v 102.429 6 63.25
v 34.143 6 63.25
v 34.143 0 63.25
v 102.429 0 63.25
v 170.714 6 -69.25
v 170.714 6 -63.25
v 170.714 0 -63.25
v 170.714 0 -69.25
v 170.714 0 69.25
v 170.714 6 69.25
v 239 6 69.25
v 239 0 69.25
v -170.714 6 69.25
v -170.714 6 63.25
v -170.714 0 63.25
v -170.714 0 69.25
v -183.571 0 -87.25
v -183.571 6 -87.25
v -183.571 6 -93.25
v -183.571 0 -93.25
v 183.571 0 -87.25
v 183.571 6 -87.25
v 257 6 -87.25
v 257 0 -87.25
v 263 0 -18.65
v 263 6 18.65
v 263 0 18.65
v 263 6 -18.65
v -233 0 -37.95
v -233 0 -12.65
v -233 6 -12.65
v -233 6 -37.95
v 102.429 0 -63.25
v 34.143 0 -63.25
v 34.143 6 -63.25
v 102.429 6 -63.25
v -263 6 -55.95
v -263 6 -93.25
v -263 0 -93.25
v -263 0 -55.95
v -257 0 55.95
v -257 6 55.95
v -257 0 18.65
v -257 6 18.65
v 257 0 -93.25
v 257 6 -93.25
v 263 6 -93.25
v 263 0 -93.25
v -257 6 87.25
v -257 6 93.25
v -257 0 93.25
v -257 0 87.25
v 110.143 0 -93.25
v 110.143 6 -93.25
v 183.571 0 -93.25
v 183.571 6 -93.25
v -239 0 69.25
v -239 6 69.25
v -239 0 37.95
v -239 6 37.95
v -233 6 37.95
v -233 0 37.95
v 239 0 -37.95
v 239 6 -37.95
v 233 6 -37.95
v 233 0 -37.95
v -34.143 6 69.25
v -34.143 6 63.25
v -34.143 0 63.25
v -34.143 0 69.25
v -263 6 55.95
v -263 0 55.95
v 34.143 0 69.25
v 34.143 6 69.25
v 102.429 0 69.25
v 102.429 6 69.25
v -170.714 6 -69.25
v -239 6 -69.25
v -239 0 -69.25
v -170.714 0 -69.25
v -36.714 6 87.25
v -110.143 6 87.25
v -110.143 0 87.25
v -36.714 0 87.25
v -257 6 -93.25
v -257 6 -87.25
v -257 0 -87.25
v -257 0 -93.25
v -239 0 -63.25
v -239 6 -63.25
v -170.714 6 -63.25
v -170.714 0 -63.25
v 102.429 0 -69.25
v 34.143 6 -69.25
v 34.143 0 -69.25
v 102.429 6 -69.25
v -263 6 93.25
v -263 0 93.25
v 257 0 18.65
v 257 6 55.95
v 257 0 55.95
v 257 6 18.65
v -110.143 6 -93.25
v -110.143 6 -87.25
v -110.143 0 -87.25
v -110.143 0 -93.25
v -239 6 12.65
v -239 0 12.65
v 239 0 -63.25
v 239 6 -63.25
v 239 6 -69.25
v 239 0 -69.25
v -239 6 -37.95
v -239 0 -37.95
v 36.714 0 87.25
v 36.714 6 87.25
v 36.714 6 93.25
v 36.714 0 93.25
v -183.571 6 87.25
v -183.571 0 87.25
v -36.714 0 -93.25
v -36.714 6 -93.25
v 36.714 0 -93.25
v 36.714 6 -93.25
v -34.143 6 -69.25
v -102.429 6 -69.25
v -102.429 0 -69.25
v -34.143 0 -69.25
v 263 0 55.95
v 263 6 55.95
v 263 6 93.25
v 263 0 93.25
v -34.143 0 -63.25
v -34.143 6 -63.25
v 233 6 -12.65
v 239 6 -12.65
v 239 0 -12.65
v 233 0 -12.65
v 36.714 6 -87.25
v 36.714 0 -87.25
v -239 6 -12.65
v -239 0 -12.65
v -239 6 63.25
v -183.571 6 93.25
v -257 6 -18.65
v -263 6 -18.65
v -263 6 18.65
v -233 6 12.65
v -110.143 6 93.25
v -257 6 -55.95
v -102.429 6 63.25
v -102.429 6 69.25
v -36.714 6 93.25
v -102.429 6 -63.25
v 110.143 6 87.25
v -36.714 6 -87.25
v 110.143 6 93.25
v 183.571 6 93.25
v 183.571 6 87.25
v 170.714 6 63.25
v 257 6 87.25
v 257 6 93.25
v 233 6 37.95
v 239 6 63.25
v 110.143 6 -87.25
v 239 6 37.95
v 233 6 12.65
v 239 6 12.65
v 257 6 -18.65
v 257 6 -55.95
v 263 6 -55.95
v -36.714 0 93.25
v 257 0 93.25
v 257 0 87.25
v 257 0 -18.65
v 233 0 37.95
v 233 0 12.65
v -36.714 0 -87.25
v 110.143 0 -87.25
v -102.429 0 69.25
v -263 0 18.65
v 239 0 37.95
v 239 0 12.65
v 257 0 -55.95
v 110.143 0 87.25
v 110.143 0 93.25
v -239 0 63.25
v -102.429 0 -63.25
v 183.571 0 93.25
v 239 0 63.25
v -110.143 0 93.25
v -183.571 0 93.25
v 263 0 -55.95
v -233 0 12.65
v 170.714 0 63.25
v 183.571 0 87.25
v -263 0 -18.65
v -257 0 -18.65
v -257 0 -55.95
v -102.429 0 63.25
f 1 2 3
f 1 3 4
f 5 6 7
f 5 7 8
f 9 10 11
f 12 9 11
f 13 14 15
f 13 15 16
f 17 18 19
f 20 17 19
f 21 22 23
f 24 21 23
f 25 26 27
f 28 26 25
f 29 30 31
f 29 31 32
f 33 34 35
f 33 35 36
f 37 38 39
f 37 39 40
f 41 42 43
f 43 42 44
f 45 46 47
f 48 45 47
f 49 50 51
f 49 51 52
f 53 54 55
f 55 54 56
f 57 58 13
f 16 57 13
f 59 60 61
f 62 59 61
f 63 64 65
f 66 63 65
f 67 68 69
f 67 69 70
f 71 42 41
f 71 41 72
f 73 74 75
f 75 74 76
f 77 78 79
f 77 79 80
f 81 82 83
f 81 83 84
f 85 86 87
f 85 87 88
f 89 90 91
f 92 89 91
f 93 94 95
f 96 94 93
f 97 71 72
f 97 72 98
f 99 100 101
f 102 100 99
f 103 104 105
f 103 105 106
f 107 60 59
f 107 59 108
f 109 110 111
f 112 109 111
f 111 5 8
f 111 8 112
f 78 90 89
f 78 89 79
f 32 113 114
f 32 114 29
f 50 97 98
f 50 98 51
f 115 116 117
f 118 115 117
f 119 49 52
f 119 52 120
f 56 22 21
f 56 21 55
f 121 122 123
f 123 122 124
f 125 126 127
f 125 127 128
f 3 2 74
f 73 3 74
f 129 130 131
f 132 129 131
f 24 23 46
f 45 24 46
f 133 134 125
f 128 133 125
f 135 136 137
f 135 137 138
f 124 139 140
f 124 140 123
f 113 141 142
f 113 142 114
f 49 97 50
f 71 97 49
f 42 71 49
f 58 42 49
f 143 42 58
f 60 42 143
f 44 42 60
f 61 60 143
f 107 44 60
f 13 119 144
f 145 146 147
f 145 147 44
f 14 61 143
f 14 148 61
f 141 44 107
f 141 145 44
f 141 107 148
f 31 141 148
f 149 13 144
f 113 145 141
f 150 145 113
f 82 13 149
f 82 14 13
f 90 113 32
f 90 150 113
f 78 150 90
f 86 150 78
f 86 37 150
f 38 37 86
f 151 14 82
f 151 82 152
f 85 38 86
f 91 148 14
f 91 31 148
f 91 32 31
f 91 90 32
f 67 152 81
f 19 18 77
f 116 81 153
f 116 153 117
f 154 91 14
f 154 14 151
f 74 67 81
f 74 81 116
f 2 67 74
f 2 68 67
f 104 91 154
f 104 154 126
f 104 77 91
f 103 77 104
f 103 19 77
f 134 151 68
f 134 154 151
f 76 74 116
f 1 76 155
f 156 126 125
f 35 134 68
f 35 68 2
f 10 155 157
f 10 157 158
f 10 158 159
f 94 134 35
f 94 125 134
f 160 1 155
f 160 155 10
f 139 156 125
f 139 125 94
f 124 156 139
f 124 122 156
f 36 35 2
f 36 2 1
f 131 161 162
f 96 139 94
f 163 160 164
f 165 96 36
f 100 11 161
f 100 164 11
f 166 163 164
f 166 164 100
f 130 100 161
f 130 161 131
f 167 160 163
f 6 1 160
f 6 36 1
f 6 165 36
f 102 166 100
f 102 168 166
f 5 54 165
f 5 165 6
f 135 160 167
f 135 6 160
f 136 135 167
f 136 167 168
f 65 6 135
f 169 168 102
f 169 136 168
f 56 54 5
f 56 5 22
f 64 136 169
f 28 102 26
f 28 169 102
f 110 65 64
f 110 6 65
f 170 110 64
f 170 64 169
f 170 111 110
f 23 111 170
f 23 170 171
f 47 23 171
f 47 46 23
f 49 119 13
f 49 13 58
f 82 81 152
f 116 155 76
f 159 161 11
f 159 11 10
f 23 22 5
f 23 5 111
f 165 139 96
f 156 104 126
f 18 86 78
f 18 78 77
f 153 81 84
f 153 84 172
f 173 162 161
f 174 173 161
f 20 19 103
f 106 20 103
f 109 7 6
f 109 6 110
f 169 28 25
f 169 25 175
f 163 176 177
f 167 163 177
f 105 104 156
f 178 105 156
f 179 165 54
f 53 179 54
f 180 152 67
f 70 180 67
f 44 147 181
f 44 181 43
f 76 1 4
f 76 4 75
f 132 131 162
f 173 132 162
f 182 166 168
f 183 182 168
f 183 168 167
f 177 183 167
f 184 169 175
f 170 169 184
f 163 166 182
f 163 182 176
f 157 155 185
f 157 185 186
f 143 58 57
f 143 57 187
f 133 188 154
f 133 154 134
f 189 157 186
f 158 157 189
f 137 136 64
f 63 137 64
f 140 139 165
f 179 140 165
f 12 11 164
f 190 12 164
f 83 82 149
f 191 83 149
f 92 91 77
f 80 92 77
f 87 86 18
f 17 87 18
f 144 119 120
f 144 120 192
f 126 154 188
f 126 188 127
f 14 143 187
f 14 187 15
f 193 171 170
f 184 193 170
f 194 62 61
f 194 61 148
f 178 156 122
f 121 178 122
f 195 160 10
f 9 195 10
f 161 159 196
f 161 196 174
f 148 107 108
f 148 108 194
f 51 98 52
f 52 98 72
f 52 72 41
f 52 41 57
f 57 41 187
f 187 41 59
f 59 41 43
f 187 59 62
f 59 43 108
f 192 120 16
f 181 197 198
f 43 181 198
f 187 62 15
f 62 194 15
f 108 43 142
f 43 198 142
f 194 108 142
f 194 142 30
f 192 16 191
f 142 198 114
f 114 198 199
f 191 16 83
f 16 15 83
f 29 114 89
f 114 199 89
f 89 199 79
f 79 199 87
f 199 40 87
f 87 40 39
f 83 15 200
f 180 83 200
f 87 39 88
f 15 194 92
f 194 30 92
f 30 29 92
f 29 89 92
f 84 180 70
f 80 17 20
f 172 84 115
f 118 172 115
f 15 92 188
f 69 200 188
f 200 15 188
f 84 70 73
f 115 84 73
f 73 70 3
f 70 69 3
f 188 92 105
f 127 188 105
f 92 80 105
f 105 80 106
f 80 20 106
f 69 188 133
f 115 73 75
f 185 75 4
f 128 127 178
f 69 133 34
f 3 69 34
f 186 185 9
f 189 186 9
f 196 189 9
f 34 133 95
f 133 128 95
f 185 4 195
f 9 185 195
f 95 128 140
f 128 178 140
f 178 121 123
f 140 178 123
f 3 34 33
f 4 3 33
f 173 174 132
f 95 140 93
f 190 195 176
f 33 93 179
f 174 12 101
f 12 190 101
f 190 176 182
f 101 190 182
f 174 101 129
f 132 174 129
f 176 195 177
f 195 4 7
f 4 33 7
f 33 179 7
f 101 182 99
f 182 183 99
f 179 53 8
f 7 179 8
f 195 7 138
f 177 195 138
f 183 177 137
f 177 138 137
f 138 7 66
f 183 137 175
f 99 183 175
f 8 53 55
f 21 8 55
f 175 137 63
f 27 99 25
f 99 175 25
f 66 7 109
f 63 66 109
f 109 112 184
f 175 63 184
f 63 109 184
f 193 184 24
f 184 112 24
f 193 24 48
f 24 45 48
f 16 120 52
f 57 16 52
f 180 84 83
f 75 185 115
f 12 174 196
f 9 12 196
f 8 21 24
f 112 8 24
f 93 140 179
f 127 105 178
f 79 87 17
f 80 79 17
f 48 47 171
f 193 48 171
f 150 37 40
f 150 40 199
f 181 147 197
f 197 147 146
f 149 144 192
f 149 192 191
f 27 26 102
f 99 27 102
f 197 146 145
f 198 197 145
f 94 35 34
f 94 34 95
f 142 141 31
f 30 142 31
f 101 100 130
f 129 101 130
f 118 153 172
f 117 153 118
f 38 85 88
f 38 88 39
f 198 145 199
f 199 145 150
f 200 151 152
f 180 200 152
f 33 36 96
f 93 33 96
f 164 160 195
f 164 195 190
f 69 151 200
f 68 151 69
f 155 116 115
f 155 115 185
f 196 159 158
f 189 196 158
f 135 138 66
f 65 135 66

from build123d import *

# Parameters (mm, degrees)
SKETCH1_W           = 466
SKETCH1_H           = 126.5
BOSS_EXTRUDE1_DEPTH = 6
SKETCH2_W           = 514
SKETCH2_H           = 174.5
SKETCH2_W_2         = 68.285714286
SKETCH2_H_2         = 6
SKETCH2_W_3         = 68.285714285
SKETCH2_W_4         = 73.428571428
SKETCH2_W_5         = 6
SKETCH2_H_3         = 25.3
SKETCH2_H_4         = 37.3
BOSS_EXTRUDE2_DEPTH = 6


with BuildPart() as part:
    # Sketch1 → Boss-Extrude1 (new body)
    with BuildSketch(Plane(origin=(0, 0, 0), x_dir=(1, 0, 0), z_dir=(0, 1, 0))):
        Rectangle(SKETCH1_W, SKETCH1_H)
    extrude(amount=BOSS_EXTRUDE1_DEPTH)

    # Sketch2 → Boss-Extrude2 (add)
    with BuildSketch(Plane(origin=(0, 6, 0), x_dir=(1, 0, 0), z_dir=(0, 1, 0))):
        Rectangle(SKETCH2_W, SKETCH2_H)
        Polygon((170.714285714, 69.25), (102.428571429, 69.25), (34.142857143, 69.25), (-34.142857143, 69.25), (-102.428571429, 69.25), (-170.714285714, 69.25), (-239, 69.25), (-239, 63.25), (-239, 37.95), (-239, 12.65), (-239, -12.65), (-239, -37.95), (-239, -63.25), (-239, -69.25), (239, -69.25), (239, 69.25), align=None, mode=Mode.SUBTRACT)
        with Locations((0, 66.25)):
            Rectangle(SKETCH2_W_2, SKETCH2_H_2)
        with Locations((-136.571428572, 66.25)):
            Rectangle(SKETCH2_W_3, SKETCH2_H_2)
        with Locations((136.571428572, 66.25)):
            Rectangle(SKETCH2_W_3, SKETCH2_H_2)
        with Locations((-146.857142857, 90.25)):
            Rectangle(SKETCH2_W_4, SKETCH2_H_2)
        with Locations((0, 90.25)):
            Rectangle(SKETCH2_W_4, SKETCH2_H_2)
        with Locations((146.857142857, 90.25)):
            Rectangle(SKETCH2_W_4, SKETCH2_H_2)
        with Locations((-236, 50.6)):
            Rectangle(SKETCH2_W_5, SKETCH2_H_3)
        Polygon((-263, 55.95), (-257, 55.95), (-257, 87.25), (-257, 93.25), (-263, 93.25), align=None)
        with Locations((-236, 0)):
            Rectangle(SKETCH2_W_5, SKETCH2_H_3)
        with Locations((-260, 0)):
            Rectangle(SKETCH2_W_5, SKETCH2_H_4)
        with Locations((-236, -50.6)):
            Rectangle(SKETCH2_W_5, SKETCH2_H_3)
        Polygon((-257, -93.25), (-257, -87.25), (-257, -55.95), (-263, -55.95), (-263, -93.25), align=None)
    boss_extrude2 = extrude(amount=-BOSS_EXTRUDE2_DEPTH)

    # Mirror2: Boss-Extrude2 across plane
    add(boss_extrude2.mirror(Plane.XY))

    # Mirror3: Boss-Extrude2 across plane
    add(boss_extrude2.mirror(Plane(origin=(0, 0, 0), x_dir=(0, 0, 1), z_dir=(1, 0, 0))))


solid = part.part
